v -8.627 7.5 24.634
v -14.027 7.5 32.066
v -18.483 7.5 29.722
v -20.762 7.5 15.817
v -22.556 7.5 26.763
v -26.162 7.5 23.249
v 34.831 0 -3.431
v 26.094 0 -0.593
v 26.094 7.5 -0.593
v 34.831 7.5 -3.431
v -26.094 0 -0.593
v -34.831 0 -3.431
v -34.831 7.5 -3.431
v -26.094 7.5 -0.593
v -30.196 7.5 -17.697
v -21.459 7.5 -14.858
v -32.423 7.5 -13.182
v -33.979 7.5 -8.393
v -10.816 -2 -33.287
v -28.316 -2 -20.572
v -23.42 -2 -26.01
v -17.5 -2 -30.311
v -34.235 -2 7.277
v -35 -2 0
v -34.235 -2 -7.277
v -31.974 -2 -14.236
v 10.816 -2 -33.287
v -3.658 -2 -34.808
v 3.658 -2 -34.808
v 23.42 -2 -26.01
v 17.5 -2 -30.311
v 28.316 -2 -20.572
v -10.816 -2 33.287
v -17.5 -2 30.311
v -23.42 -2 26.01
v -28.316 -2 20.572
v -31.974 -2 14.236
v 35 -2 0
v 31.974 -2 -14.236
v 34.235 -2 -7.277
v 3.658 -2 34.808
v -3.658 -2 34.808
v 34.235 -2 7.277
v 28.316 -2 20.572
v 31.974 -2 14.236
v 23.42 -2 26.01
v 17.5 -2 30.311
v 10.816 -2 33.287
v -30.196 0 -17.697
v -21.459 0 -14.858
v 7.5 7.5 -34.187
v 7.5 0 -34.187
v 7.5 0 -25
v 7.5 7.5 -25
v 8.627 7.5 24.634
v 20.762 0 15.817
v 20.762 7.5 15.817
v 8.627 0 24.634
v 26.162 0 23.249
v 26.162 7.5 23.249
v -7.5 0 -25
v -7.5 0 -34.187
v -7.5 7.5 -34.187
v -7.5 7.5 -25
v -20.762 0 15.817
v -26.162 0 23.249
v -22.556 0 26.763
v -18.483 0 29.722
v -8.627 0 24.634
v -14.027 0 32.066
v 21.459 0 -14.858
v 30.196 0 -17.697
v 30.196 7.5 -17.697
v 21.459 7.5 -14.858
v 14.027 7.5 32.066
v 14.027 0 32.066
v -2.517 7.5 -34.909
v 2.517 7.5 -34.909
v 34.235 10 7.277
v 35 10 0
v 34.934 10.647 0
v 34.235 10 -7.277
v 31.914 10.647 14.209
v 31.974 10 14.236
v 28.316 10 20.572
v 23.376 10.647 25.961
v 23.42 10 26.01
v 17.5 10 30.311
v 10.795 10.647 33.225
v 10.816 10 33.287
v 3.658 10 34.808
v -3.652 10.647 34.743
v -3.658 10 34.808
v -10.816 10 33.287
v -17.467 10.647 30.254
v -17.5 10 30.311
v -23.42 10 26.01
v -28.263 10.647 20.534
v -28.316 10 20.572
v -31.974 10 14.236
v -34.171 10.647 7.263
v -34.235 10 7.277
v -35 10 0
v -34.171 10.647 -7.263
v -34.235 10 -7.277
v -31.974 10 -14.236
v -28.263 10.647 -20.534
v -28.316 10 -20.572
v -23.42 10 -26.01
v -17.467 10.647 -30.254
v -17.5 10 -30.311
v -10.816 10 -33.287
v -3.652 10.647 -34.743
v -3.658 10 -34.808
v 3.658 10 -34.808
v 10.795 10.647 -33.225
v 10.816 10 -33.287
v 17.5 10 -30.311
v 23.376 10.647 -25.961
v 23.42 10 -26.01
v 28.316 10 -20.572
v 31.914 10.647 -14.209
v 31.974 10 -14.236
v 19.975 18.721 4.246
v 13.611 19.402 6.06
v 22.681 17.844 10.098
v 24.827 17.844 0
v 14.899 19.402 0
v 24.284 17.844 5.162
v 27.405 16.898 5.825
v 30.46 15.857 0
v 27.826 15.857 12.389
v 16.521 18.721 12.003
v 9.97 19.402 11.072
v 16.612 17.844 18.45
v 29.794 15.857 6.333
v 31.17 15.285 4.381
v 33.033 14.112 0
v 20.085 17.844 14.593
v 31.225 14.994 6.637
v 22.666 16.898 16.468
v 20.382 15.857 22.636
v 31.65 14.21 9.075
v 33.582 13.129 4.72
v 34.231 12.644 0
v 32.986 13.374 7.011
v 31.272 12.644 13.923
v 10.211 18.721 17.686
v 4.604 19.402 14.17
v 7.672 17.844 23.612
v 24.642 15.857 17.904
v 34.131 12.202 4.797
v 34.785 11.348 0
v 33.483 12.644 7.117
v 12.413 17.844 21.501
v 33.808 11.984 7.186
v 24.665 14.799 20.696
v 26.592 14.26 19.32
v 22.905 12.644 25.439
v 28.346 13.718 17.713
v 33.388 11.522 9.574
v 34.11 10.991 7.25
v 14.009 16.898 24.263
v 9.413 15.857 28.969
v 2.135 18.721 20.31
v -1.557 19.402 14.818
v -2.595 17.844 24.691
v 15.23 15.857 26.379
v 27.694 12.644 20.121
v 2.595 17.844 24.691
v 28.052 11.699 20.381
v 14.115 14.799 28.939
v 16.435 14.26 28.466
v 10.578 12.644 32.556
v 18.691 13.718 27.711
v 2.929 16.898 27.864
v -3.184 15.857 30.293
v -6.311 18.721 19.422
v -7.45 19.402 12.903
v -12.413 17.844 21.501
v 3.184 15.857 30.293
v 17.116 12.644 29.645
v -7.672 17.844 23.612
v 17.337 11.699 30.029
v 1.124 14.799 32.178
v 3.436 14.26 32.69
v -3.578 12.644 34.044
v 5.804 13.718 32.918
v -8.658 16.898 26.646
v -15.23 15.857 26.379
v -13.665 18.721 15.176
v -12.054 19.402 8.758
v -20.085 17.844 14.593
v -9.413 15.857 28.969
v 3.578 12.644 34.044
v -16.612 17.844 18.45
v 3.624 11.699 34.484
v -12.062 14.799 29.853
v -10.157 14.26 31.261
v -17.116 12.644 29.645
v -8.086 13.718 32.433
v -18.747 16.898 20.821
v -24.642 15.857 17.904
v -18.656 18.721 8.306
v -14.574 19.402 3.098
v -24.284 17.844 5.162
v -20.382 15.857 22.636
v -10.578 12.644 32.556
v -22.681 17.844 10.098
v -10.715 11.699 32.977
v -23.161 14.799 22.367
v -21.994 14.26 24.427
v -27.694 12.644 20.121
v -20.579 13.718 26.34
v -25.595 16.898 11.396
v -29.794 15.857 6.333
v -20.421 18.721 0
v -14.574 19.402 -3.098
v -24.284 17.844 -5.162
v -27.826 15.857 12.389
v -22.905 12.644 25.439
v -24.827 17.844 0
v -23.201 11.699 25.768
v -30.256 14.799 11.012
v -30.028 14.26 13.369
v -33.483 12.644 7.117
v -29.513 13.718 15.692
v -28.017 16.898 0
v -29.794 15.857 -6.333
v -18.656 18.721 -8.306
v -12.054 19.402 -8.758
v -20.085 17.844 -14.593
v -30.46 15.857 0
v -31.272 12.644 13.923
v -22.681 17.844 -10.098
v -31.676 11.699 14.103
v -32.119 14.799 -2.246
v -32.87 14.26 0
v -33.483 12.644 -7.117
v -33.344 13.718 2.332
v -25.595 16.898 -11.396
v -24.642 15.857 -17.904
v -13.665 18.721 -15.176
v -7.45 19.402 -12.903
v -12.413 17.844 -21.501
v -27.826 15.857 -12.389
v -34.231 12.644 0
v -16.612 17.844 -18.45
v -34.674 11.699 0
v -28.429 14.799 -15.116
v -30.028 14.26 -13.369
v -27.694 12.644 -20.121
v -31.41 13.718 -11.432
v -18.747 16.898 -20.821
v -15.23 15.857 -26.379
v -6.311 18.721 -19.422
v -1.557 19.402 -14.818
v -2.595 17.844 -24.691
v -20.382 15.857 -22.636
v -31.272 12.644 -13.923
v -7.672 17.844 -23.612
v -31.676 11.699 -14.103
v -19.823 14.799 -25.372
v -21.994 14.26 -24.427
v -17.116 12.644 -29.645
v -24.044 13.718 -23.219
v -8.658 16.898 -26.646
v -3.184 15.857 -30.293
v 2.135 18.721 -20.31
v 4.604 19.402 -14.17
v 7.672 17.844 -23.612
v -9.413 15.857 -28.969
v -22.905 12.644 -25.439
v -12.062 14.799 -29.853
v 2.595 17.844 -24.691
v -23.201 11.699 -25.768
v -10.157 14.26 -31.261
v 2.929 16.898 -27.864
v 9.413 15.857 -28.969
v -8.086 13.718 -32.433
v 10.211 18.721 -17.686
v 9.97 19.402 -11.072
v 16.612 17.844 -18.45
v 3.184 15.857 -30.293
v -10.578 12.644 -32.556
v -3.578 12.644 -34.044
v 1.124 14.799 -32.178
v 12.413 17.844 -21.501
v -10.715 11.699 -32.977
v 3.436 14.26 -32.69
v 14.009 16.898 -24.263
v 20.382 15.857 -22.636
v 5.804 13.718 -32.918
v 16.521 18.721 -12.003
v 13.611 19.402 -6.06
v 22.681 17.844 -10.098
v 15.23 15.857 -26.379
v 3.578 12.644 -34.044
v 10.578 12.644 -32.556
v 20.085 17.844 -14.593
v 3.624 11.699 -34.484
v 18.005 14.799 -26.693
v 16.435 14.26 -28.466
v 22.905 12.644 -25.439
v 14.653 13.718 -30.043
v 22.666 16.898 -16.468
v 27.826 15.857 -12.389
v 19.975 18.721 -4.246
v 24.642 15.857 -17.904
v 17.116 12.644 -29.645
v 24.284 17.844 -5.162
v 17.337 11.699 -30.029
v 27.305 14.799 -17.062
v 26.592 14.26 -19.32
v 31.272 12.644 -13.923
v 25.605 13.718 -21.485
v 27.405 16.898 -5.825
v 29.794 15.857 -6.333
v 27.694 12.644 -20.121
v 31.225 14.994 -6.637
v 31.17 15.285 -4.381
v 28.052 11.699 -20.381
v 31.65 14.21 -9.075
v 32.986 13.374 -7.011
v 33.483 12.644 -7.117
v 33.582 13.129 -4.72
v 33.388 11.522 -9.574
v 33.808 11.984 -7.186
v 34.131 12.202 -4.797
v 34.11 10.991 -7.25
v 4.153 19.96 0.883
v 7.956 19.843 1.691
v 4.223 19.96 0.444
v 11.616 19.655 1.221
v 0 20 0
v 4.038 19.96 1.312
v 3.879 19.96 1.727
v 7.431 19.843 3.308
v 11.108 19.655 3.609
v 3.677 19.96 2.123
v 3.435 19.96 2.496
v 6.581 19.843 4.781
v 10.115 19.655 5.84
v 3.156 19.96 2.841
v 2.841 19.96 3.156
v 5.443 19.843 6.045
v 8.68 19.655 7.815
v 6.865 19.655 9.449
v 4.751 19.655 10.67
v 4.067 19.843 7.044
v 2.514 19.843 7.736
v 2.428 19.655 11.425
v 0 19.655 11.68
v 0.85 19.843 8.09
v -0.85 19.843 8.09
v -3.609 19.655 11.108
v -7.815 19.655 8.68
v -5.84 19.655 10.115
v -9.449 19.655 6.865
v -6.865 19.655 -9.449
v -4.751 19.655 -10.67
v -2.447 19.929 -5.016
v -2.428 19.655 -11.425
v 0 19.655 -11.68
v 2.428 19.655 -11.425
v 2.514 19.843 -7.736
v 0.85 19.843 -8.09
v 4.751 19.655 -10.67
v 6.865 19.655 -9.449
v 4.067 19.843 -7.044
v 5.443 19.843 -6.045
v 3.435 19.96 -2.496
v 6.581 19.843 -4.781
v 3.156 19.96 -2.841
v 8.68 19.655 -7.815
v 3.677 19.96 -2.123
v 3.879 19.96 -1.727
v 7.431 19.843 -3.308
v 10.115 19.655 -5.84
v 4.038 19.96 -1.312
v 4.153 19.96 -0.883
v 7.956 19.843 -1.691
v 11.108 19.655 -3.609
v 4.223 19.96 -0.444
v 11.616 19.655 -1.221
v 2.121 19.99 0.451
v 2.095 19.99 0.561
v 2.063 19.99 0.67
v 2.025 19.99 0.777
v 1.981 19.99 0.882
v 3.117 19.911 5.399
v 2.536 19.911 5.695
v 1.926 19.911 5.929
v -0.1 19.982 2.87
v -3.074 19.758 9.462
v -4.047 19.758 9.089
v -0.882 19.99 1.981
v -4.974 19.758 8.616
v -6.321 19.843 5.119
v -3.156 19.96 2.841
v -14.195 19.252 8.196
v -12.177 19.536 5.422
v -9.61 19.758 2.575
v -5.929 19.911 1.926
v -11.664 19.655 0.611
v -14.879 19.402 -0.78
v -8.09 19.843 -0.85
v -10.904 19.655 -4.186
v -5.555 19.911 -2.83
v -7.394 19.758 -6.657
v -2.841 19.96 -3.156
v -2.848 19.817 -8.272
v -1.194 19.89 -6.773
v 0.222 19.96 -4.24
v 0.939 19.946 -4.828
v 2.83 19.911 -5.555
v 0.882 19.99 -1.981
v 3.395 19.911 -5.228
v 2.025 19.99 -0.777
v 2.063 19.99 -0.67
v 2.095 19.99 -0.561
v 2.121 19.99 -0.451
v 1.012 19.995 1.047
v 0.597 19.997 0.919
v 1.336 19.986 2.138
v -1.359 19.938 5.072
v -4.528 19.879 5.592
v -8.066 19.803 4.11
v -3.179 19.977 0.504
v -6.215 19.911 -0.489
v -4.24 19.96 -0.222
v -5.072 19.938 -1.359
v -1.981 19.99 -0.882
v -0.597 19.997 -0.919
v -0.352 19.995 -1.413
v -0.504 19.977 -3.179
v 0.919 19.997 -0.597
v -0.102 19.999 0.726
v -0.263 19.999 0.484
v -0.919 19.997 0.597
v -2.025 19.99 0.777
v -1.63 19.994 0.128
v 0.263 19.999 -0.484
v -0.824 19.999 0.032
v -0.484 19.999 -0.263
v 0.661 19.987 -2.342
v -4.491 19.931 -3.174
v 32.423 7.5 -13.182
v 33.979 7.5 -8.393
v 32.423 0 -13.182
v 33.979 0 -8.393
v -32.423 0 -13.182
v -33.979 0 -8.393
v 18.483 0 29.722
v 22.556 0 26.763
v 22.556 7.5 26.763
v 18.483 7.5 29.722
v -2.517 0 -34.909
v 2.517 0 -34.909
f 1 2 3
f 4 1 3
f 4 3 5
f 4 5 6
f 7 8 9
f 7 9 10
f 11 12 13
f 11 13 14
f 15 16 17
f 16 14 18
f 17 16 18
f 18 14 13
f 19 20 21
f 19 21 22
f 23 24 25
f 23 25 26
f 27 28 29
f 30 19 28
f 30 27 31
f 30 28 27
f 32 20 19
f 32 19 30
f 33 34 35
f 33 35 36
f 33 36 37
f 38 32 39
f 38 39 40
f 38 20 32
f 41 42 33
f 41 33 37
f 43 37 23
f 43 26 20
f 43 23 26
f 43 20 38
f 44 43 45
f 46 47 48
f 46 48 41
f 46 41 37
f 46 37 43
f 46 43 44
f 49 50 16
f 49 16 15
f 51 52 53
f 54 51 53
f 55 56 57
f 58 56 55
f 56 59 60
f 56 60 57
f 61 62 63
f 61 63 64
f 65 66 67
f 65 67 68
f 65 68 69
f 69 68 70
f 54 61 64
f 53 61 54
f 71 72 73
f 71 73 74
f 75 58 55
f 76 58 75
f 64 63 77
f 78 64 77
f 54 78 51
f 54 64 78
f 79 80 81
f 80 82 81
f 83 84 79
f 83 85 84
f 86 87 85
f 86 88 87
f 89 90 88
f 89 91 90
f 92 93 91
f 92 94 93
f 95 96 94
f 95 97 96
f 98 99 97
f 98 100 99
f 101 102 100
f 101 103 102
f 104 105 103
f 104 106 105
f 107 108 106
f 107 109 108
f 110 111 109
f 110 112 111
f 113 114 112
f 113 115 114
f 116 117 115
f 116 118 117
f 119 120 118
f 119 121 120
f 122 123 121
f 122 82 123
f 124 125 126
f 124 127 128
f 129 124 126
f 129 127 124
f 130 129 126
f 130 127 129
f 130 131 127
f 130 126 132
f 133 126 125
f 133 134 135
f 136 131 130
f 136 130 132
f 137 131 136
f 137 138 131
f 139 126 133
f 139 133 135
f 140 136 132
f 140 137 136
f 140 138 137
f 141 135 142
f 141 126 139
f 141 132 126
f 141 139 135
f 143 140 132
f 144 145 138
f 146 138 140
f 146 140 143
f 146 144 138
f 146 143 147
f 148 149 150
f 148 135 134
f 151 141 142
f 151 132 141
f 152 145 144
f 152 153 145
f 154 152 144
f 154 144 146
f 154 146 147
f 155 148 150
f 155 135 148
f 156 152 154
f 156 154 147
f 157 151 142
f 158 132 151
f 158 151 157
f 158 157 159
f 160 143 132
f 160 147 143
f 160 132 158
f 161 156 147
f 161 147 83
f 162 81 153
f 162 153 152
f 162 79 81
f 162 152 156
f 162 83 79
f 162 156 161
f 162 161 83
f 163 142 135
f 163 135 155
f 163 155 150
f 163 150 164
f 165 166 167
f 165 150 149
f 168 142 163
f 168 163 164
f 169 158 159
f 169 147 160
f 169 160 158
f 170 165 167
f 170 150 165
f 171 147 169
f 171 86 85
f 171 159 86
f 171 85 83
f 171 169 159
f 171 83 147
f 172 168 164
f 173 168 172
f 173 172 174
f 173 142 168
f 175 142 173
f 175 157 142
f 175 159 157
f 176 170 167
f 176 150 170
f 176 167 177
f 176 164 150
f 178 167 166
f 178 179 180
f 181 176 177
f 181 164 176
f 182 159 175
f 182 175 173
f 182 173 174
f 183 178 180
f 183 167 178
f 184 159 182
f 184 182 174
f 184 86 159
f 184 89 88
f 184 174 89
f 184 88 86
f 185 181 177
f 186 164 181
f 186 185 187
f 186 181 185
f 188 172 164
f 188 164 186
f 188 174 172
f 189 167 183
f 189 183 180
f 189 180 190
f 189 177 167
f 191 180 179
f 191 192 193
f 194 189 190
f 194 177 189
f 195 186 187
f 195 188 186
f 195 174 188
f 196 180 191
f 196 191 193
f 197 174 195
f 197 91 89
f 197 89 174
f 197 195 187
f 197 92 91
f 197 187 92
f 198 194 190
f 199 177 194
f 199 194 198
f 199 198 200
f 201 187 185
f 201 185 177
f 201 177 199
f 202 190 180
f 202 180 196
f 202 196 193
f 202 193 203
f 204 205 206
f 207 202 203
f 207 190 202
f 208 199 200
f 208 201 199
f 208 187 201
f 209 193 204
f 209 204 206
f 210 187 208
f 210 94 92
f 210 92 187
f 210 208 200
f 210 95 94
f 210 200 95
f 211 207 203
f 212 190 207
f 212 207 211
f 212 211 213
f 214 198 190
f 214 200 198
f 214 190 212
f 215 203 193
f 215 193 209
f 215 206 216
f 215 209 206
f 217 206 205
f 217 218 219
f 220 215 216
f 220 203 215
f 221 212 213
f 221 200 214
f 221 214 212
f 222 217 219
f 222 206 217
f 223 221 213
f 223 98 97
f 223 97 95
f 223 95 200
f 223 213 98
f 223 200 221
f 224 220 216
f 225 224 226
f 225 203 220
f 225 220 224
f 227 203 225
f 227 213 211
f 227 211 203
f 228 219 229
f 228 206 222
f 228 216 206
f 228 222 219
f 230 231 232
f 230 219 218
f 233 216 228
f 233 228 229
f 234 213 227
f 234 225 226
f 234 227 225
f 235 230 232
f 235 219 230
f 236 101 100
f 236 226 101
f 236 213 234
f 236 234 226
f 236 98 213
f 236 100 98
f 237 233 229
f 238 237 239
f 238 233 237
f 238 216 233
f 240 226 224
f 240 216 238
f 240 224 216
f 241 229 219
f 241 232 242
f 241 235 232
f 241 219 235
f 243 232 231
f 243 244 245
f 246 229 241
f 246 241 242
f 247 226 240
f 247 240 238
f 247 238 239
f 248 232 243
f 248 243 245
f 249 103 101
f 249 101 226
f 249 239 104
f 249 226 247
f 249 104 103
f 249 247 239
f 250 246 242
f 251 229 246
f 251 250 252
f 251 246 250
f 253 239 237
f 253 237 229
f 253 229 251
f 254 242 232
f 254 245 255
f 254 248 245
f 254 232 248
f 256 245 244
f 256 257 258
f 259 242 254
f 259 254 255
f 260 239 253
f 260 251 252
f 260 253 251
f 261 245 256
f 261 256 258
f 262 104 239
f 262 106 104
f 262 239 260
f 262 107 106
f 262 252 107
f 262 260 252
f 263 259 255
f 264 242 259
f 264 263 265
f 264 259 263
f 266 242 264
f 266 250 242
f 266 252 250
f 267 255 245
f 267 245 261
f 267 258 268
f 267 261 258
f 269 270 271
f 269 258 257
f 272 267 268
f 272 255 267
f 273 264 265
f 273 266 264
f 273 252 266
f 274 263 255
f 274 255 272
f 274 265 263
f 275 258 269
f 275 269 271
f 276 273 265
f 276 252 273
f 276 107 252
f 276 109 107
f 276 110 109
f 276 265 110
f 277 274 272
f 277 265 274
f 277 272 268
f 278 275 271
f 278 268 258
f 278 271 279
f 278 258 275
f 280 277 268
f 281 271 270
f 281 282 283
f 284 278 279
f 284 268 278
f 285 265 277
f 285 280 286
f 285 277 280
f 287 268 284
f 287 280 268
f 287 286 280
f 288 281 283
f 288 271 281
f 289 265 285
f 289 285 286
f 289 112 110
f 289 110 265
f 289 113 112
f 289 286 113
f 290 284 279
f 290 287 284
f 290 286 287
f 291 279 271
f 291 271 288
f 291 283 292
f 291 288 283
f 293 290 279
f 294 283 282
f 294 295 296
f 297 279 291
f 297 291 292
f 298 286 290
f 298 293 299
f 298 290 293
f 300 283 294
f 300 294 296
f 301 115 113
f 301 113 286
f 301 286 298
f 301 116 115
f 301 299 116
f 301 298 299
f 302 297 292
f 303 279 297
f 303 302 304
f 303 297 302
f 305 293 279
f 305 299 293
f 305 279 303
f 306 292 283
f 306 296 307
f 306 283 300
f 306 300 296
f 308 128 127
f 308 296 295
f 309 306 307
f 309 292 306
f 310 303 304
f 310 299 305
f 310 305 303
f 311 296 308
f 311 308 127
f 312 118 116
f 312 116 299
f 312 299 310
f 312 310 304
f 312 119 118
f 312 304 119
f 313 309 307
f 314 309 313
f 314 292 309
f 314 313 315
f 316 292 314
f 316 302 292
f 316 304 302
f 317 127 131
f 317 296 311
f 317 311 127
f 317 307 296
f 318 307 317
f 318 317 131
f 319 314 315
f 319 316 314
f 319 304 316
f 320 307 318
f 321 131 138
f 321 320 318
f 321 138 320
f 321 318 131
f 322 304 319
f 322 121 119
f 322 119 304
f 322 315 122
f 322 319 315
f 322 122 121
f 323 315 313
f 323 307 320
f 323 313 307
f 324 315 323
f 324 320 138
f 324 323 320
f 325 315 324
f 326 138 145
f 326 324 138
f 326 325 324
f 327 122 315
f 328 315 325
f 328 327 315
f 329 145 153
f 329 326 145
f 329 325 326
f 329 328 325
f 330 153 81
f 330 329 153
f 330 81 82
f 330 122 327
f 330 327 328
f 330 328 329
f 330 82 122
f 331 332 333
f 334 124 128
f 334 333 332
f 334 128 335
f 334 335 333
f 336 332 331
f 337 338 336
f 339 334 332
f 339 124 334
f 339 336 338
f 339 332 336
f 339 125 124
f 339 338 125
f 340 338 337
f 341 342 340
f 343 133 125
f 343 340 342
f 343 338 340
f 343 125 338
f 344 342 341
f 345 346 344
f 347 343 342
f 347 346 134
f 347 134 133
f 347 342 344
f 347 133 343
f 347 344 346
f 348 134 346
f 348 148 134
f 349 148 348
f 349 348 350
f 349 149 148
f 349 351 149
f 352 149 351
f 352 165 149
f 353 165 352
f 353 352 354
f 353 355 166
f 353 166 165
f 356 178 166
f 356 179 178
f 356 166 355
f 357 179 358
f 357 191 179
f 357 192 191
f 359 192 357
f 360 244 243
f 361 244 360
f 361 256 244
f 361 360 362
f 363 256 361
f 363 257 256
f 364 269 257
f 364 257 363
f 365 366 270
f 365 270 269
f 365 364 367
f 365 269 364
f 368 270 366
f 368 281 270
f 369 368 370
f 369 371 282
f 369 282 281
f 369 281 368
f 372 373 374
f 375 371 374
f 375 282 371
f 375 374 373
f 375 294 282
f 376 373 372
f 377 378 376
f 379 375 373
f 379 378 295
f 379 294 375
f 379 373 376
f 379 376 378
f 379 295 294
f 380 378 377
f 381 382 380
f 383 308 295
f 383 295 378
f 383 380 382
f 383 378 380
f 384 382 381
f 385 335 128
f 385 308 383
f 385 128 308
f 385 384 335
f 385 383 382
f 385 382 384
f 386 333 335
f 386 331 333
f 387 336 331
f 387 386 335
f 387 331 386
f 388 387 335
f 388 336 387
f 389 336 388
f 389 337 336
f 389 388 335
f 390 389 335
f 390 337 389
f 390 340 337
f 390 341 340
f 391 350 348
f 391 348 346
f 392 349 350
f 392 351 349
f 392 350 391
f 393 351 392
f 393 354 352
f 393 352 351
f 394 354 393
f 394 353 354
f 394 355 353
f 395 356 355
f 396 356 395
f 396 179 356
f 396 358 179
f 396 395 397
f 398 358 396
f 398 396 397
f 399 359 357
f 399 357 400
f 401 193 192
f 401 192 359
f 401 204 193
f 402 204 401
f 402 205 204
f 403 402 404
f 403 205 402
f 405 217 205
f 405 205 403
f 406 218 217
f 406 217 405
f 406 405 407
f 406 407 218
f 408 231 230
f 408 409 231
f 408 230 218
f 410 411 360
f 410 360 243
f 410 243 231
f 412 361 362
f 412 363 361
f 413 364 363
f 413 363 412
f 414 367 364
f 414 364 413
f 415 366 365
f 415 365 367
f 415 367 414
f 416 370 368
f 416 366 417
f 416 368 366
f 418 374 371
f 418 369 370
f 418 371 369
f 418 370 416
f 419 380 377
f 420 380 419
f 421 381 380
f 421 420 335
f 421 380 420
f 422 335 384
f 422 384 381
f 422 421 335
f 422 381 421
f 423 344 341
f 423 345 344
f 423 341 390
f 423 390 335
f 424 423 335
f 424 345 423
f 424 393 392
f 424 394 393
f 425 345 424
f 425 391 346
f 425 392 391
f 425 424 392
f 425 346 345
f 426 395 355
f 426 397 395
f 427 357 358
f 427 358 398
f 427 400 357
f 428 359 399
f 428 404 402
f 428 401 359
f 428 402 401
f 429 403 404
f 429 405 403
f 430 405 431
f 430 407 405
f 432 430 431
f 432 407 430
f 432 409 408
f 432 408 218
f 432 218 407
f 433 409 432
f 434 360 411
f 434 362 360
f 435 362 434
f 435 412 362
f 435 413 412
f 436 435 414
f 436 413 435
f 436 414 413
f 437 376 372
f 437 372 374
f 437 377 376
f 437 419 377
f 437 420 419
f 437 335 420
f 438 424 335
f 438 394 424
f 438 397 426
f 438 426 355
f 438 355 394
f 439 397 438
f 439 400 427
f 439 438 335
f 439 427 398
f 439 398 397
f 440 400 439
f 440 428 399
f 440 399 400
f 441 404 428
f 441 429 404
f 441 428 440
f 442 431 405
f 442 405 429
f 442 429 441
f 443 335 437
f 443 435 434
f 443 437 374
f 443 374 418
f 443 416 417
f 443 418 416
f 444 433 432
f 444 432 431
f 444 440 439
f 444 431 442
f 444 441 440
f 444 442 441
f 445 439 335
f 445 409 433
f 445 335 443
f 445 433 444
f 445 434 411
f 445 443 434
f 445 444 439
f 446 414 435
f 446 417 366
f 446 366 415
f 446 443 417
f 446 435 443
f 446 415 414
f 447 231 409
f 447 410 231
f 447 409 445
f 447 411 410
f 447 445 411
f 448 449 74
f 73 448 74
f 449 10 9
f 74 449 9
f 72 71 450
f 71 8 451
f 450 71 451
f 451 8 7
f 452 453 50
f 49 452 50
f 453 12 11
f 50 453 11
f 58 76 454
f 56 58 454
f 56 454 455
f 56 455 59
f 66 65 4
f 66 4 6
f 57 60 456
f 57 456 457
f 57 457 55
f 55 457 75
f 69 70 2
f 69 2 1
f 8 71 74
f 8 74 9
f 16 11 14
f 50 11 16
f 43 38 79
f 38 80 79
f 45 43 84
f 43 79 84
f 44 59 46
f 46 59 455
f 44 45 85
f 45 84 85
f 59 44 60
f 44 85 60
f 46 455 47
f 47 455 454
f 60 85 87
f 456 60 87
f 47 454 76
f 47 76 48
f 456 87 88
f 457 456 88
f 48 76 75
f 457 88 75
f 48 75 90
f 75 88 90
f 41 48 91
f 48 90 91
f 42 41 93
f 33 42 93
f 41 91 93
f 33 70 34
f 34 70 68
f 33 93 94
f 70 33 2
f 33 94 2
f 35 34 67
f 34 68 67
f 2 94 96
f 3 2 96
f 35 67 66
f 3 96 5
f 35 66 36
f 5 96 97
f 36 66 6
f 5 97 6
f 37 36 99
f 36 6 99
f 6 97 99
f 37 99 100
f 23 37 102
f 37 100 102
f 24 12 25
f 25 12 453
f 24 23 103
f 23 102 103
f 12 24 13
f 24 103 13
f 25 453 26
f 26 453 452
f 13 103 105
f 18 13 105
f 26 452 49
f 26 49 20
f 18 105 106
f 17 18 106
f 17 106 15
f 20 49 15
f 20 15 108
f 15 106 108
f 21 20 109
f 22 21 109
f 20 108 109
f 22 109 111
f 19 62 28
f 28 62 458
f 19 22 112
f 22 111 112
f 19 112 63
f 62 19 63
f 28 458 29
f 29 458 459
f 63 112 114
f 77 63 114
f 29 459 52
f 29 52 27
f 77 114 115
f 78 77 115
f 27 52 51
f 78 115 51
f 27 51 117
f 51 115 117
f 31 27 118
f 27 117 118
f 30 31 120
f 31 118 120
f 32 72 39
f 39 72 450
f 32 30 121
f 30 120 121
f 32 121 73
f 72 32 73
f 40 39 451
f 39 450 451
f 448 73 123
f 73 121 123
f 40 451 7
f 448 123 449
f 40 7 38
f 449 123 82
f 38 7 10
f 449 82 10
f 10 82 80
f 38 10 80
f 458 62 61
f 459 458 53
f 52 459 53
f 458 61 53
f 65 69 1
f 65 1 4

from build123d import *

# Parameters (mm, degrees)
ESQUISSE3_W             = 15
ESQUISSE3_H             = 20
ENL_V_MAT_EXTRU_1_DEPTH = 7.5
ESQUISSE4_R             = 35
BOSS_EXTRU_1_DEPTH      = 2


with BuildPart() as part:
    # Esquisse2 → Révolution1 (revolve)
    with BuildSketch(Plane.XY):
        with BuildLine():
            Line((0, 20), (0, 0))
            Line((0, 0), (35, 0))
            Line((35, 0), (35, 10))
            add(Edge.make_bspline(
                [(0, 20), (32.349399846, 20), (34.80179319, 13.431096766), (35, 10)],
                knots=[0, 0, 0, 0, 1, 1, 1, 1], degree=3))
        make_face()
    revolve(axis=Axis((0, 20, 0), (0, -1, 0)))

    # Esquisse3 → Enlèv. mat.-Extru.1 (cut)
    with BuildSketch(Plane.XZ):
        with Locations((0, -35)):
            Rectangle(ESQUISSE3_W, ESQUISSE3_H)
        Polygon((-45.115170691, -6.772840875), (-26.094040365, -0.592500987), (-21.45878545, -14.858348732), (-40.479915775, -21.038688619), align=None)
        Polygon((-20.382708895, 40.814154139), (-8.627003849, 24.633814252), (-20.762258765, 15.817035467), (-32.517963811, 31.997375355), align=None)
        Polygon((32.517963811, 31.997375355), (20.762258765, 15.817035467), (8.627003849, 24.633814252), (20.382708895, 40.814154139), align=None)
        Polygon((40.479915775, -21.038688619), (21.45878545, -14.858348732), (26.094040365, -0.592500987), (45.115170691, -6.772840875), align=None)
    extrude(amount=-ENL_V_MAT_EXTRU_1_DEPTH, mode=Mode.SUBTRACT)

    # Esquisse4 → Boss.-Extru.1 (add)
    with BuildSketch(Plane.XZ):
        Circle(ESQUISSE4_R)
    extrude(amount=BOSS_EXTRU_1_DEPTH)


solid = part.part
